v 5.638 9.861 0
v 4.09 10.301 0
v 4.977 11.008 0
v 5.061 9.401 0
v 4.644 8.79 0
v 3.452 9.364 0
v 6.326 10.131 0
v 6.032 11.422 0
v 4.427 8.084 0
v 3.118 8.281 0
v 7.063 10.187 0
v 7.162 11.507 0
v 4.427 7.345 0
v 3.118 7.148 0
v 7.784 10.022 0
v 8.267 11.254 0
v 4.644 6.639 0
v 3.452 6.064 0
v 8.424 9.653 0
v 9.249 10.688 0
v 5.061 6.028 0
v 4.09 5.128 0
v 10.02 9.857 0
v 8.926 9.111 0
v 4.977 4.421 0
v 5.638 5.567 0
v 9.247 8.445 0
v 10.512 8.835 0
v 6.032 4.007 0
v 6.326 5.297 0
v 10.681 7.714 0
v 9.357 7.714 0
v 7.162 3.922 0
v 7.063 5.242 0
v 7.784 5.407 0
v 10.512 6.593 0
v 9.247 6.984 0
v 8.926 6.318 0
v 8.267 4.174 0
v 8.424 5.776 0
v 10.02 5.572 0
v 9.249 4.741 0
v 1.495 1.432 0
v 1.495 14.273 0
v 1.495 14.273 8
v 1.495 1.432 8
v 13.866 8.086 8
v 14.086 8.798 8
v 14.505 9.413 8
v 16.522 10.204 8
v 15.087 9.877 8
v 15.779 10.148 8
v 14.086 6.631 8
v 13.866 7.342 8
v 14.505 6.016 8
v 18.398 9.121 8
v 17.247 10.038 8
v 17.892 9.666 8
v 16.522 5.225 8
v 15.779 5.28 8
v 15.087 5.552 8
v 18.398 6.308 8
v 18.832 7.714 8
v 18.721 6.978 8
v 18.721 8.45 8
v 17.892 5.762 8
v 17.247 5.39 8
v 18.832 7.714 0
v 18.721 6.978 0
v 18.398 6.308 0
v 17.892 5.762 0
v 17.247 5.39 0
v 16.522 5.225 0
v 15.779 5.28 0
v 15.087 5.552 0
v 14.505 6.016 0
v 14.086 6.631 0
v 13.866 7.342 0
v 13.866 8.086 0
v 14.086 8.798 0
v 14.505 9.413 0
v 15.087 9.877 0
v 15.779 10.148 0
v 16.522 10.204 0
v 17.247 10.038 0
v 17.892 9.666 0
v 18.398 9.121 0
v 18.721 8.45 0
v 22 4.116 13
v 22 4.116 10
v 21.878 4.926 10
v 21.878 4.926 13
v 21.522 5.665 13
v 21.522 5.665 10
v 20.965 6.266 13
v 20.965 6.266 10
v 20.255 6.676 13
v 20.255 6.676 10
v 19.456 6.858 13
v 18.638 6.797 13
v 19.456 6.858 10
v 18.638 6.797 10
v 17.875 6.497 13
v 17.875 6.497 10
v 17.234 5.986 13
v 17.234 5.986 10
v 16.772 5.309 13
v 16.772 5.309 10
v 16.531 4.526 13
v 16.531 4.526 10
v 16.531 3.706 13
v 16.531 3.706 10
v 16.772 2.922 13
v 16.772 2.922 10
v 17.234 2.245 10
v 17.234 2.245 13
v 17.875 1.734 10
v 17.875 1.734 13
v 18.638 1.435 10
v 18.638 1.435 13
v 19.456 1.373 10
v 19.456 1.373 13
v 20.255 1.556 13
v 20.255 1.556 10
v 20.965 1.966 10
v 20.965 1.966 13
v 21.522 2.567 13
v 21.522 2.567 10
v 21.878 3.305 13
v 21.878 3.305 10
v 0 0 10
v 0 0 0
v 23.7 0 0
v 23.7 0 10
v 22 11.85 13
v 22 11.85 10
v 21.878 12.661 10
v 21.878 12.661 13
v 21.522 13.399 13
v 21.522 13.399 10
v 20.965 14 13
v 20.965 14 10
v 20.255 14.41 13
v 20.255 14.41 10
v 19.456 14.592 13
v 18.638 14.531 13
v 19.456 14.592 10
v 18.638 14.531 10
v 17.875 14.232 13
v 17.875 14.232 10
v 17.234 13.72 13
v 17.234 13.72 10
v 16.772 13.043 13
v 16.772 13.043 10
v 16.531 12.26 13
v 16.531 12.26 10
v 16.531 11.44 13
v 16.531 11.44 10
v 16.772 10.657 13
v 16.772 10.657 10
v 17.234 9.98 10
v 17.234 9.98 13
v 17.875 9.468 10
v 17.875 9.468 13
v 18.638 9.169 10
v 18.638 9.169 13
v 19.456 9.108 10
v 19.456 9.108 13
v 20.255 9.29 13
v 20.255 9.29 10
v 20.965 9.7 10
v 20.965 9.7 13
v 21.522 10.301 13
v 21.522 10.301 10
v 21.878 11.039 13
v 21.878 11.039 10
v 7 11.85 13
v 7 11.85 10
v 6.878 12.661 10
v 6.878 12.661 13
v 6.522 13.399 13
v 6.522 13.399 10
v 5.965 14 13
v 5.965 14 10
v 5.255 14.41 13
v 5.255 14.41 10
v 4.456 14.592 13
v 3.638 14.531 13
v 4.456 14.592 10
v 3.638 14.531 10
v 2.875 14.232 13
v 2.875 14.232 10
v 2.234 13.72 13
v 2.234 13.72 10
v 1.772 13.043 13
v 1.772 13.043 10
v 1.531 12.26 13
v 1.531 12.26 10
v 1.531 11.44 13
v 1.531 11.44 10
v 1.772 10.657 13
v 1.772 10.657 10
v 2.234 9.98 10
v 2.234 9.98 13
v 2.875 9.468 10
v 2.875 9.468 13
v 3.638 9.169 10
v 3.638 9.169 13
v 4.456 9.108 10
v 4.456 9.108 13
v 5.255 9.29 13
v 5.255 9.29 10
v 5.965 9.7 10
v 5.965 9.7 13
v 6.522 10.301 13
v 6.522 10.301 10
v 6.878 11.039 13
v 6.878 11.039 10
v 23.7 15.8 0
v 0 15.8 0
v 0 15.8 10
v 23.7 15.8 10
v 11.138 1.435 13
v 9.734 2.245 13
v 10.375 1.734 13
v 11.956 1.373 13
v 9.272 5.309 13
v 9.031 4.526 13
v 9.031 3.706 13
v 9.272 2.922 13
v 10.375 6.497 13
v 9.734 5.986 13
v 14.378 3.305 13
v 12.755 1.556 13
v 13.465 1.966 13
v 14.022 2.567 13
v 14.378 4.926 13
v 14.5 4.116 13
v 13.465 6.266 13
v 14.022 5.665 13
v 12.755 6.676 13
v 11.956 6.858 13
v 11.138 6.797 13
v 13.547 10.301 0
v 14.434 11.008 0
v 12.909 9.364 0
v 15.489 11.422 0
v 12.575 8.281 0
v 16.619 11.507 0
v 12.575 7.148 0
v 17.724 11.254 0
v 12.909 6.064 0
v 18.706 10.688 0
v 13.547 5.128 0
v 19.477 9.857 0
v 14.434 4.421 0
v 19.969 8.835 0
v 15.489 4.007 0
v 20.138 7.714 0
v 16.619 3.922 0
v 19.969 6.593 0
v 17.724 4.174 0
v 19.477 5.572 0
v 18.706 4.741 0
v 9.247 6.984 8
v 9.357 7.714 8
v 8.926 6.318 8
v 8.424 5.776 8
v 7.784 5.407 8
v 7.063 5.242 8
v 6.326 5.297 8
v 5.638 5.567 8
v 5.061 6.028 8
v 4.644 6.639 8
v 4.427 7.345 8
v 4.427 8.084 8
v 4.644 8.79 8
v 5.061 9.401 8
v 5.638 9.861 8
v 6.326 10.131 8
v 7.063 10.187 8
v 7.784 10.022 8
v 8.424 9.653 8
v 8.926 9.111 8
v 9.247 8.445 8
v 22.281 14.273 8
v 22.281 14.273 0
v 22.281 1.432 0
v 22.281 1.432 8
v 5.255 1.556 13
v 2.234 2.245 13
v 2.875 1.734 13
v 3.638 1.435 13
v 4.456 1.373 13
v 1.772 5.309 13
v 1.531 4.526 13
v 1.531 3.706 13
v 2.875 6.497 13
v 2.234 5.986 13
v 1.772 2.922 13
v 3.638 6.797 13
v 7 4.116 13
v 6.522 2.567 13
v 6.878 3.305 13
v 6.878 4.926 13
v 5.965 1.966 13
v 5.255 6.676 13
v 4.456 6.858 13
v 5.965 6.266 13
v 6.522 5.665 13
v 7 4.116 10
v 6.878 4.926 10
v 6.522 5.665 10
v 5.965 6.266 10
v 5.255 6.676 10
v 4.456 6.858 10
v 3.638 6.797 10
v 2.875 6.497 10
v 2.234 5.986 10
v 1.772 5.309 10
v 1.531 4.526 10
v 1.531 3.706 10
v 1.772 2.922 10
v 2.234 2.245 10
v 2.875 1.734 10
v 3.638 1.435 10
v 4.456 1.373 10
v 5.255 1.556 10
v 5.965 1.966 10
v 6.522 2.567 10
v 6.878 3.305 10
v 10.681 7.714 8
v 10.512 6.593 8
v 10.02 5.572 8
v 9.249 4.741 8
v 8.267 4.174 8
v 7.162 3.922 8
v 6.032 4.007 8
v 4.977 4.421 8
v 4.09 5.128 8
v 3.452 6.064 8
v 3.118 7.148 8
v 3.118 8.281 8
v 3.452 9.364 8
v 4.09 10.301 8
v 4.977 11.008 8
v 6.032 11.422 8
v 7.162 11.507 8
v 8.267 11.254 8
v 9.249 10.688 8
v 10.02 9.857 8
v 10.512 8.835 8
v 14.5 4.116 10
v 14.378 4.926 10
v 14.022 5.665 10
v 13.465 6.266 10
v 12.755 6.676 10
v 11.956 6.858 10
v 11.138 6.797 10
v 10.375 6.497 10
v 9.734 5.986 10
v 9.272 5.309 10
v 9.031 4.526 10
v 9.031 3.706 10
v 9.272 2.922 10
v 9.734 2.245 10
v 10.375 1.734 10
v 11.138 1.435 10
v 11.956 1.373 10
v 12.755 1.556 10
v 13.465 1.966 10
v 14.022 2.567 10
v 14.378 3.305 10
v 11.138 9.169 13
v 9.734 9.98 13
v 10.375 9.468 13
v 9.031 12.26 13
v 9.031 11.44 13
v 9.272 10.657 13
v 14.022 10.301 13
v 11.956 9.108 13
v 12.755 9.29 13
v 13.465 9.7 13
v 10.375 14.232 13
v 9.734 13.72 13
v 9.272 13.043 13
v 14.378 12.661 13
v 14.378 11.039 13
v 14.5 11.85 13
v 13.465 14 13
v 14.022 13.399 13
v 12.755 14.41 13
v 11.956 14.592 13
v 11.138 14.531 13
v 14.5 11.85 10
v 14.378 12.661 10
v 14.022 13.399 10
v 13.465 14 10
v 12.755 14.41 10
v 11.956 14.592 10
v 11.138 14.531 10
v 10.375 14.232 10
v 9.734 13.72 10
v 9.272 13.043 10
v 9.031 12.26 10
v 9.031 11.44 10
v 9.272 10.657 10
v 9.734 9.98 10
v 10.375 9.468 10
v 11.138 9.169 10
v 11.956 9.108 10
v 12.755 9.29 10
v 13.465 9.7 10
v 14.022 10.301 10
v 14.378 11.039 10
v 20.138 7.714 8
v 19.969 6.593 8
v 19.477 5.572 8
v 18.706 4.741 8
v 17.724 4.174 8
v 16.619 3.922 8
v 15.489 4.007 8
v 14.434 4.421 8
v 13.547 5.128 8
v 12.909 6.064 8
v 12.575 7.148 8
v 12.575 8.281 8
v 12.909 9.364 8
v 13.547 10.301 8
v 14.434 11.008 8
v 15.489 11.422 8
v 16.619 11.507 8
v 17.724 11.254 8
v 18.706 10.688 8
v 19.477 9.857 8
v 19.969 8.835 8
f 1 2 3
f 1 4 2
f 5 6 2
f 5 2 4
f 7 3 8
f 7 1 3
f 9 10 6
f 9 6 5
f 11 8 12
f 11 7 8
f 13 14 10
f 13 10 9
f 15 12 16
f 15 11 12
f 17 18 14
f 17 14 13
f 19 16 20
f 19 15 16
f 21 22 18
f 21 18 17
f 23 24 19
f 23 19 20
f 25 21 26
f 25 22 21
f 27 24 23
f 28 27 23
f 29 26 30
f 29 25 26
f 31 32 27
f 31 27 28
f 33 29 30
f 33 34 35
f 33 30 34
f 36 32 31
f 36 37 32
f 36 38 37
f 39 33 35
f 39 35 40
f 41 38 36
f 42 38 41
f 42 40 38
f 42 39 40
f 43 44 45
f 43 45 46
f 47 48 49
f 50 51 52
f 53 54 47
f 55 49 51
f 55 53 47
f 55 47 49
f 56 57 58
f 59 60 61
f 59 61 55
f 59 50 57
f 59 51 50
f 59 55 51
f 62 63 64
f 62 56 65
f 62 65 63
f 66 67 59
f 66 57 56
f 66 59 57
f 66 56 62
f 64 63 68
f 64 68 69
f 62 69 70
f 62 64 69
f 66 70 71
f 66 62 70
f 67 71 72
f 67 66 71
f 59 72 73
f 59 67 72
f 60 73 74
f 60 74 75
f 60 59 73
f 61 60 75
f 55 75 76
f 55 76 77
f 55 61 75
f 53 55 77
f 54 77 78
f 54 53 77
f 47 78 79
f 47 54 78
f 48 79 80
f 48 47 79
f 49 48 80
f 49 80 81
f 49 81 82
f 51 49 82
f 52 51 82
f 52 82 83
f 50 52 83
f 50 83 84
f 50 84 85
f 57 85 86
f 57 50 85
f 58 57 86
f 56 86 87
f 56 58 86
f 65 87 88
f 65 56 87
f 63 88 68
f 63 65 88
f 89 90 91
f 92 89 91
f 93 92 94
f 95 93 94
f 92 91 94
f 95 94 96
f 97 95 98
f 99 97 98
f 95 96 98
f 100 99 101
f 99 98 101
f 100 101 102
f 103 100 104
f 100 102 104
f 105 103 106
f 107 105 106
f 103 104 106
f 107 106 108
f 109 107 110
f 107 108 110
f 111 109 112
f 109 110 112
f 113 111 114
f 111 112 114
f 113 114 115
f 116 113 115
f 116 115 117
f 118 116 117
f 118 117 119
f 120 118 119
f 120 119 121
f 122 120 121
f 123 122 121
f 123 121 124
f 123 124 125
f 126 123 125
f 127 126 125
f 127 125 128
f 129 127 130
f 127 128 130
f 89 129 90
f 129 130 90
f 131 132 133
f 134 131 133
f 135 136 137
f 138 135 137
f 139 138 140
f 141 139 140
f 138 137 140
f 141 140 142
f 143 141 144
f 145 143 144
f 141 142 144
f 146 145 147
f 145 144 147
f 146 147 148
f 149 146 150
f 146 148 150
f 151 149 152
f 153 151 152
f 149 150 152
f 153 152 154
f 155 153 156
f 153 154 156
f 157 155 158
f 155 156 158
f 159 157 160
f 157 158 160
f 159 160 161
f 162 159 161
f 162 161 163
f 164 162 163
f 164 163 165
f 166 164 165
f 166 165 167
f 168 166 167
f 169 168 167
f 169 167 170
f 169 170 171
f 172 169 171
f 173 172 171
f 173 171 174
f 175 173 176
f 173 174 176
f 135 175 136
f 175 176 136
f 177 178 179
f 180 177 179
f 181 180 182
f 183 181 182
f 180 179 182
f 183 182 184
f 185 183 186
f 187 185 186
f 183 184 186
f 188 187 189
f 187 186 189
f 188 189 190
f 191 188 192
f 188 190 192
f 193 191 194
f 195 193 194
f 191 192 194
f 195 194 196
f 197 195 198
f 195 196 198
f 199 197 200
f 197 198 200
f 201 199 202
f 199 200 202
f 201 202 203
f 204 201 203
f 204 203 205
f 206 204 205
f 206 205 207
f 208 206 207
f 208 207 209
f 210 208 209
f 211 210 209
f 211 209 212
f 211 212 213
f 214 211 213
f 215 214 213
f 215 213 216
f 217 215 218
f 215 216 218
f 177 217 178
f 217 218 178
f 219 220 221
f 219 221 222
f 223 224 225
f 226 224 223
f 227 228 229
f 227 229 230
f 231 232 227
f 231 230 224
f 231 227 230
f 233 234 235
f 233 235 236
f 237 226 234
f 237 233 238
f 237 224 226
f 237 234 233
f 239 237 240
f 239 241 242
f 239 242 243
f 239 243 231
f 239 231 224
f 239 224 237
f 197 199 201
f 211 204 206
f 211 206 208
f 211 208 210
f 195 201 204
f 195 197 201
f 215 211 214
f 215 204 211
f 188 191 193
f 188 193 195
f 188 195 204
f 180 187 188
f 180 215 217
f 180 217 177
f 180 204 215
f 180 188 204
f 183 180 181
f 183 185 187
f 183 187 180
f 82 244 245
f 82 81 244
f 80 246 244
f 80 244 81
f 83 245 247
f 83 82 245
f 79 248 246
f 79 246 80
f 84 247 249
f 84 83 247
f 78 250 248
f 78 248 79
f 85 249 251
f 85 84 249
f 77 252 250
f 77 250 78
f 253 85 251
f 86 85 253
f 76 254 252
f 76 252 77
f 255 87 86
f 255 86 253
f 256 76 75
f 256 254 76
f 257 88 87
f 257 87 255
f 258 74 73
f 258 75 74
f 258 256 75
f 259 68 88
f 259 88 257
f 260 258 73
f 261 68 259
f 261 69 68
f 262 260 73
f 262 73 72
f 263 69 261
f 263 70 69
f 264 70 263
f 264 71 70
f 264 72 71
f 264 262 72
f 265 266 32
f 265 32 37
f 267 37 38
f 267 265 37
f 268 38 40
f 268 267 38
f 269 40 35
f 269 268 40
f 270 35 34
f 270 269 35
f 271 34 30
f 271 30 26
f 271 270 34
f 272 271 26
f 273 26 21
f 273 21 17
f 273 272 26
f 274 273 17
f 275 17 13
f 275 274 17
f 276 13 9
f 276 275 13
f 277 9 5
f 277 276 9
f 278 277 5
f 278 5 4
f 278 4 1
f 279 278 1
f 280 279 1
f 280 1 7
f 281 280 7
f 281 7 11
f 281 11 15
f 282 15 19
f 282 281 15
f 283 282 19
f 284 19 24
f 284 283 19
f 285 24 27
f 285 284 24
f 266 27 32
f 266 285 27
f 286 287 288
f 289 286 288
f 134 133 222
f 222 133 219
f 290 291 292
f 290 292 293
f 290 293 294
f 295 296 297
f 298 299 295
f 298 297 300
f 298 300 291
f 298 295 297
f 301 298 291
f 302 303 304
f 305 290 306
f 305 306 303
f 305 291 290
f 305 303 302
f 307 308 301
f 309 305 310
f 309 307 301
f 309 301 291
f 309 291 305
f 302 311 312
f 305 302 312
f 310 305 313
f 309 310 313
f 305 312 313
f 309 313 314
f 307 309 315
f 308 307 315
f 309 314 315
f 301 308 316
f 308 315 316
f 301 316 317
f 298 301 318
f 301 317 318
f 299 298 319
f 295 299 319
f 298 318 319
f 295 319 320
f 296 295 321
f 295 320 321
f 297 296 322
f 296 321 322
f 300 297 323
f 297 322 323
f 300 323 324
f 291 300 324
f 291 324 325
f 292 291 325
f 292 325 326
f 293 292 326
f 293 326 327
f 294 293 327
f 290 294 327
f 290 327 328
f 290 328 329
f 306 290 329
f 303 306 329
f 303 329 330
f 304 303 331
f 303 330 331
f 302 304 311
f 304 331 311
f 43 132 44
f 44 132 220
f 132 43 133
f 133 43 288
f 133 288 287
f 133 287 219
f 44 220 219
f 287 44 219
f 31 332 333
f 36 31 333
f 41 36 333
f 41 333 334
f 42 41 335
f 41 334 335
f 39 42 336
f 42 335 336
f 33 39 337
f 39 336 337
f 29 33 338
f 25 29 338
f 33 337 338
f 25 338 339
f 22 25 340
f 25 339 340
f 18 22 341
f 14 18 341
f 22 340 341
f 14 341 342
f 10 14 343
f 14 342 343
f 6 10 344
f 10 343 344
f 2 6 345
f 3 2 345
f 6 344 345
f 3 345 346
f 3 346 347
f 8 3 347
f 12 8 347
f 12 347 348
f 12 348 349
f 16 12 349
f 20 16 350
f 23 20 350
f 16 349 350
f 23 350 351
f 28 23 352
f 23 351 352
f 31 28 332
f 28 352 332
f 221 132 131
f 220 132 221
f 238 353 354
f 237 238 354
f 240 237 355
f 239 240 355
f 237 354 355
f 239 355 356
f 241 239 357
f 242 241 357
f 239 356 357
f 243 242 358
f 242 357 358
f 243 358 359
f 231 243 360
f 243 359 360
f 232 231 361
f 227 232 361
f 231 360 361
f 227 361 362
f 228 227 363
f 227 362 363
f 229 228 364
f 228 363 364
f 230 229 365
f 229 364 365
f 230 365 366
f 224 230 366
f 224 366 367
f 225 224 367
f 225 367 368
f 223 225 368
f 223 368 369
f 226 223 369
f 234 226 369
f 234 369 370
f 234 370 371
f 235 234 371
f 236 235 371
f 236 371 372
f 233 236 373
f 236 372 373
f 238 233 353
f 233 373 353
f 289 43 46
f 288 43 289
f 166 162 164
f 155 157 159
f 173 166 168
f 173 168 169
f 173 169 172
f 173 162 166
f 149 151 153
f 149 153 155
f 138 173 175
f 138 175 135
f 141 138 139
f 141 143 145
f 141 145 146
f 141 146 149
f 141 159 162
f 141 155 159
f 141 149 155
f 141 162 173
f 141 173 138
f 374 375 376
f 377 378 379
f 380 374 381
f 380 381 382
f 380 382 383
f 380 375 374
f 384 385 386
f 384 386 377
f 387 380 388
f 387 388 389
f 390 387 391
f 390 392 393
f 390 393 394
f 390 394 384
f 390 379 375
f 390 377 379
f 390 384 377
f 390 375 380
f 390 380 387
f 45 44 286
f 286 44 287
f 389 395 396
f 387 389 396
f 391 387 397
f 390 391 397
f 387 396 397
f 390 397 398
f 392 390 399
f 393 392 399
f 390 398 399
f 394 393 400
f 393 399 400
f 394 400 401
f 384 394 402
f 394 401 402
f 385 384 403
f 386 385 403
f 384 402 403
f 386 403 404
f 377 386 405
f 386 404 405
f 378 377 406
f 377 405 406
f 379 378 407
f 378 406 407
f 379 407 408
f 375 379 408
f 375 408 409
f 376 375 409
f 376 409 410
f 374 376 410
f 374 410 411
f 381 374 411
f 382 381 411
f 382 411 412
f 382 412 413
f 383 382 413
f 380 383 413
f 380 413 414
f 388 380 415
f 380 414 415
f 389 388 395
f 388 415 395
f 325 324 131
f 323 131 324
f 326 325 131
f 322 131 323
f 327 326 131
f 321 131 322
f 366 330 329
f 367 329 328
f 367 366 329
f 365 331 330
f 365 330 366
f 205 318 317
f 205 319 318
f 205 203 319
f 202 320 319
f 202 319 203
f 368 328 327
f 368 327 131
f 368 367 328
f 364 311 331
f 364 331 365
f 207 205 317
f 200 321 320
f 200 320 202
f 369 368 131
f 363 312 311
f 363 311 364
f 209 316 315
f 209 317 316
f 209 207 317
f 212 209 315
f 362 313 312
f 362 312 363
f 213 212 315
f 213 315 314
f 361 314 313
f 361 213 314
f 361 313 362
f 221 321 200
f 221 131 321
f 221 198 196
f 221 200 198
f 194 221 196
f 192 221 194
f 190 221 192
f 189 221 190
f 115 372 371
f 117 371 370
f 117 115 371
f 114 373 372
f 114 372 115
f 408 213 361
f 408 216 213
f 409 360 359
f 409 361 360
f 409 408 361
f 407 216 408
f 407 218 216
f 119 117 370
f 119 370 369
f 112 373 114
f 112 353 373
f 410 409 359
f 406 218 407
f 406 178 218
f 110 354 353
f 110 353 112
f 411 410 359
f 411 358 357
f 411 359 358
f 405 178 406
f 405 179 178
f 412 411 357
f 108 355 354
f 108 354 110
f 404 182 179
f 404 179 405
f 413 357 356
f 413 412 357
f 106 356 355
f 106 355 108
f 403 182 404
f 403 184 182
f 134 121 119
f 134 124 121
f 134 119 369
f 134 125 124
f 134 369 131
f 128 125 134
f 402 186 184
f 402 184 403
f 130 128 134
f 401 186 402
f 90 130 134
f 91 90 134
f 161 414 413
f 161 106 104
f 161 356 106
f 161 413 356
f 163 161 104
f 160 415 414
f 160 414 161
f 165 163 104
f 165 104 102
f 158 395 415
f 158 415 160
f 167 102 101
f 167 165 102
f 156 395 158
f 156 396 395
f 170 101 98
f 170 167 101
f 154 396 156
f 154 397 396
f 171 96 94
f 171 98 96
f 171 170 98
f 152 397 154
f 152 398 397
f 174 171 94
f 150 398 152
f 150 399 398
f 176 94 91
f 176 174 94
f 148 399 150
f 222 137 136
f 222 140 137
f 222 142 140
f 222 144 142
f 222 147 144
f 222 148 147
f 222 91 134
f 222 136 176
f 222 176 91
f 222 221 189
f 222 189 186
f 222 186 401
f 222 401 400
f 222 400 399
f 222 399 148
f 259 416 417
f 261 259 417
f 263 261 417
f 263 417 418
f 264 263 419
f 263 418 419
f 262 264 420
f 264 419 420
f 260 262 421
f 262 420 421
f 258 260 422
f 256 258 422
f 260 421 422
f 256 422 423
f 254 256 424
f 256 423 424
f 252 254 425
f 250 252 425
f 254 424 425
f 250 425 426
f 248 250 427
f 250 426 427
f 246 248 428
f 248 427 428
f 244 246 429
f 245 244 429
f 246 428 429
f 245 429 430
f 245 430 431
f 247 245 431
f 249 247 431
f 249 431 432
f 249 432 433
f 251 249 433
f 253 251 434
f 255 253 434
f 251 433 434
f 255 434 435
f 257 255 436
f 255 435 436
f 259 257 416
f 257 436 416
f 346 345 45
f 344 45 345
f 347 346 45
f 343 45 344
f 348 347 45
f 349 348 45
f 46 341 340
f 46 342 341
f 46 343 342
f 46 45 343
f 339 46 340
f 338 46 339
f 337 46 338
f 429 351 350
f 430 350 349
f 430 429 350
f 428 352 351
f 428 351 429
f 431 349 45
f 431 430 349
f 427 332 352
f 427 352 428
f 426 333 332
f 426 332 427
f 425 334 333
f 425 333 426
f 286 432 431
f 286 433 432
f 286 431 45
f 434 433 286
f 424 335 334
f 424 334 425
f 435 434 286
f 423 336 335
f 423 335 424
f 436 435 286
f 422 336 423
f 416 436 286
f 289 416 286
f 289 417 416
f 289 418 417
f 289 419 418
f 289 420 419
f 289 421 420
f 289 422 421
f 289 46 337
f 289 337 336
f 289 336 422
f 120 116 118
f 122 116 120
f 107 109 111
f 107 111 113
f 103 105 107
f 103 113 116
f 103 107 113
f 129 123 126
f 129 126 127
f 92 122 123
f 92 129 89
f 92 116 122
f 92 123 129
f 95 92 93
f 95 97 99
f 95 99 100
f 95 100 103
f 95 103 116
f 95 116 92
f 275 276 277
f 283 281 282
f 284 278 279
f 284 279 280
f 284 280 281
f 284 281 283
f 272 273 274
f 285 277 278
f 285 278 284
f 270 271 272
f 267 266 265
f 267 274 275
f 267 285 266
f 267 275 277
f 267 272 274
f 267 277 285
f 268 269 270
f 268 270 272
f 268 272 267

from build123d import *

# Parameters (mm, degrees)
F0_W     = 23.7
F0_H     = 15.8
F1_DEPTH = 10
F2_R     = 2.75
F3_DEPTH = 3
F4_W     = 20.786194
F4_H     = 12.840617
F5_DEPTH = 8
F6_R     = 3.802905
F6_R_2   = 2.49672
F6_R_3   = 2.479142
F7_DEPTH = 8


with BuildPart() as f1:
    # F0 (on Top) → F1 (new body)
    with BuildSketch(Plane.XY):
        with Locations((11.85, 7.9)):
            Rectangle(F0_W, F0_H)
    extrude(amount=F1_DEPTH)

    # F2 (on face) → F3 (join)
    with BuildSketch(Plane.XY.offset(10)):
        with Locations((4.25, 11.85)):
            Circle(F2_R)
        with Locations((11.75, 11.85)):
            Circle(F2_R)
        with Locations((19.25, 11.85)):
            Circle(F2_R)
        with Locations((4.25, 4.115675)):
            Circle(F2_R)
        with Locations((11.75, 4.115675)):
            Circle(F2_R)
        with Locations((19.25, 4.115675)):
            Circle(F2_R)
    extrude(amount=F3_DEPTH)

    # F4 (on face) → F5 (cut)
    with BuildSketch(Plane(origin=(0, 0, 0), x_dir=(1, 0, 0), z_dir=(0, 0, -1))):
        with Locations((11.888078, -7.852494)):
            Rectangle(F4_W, F4_H)
    extrude(amount=-F5_DEPTH, mode=Mode.SUBTRACT)

    # F6 (on face) → F7 (join)
    with BuildSketch(Plane(origin=(0, 0, 8), x_dir=(1, 0, 0), z_dir=(0, 0, -1))):
        with Locations((16.33504, -7.714347)):
            Circle(F6_R)
        with Locations((16.33504, -7.714347)):
            Circle(F6_R_2, mode=Mode.SUBTRACT)
        with Locations((6.87801, -7.714347)):
            Circle(F6_R)
        with Locations((6.87801, -7.714347)):
            Circle(F6_R_3, mode=Mode.SUBTRACT)
    extrude(amount=F7_DEPTH)


solid = f1.part
